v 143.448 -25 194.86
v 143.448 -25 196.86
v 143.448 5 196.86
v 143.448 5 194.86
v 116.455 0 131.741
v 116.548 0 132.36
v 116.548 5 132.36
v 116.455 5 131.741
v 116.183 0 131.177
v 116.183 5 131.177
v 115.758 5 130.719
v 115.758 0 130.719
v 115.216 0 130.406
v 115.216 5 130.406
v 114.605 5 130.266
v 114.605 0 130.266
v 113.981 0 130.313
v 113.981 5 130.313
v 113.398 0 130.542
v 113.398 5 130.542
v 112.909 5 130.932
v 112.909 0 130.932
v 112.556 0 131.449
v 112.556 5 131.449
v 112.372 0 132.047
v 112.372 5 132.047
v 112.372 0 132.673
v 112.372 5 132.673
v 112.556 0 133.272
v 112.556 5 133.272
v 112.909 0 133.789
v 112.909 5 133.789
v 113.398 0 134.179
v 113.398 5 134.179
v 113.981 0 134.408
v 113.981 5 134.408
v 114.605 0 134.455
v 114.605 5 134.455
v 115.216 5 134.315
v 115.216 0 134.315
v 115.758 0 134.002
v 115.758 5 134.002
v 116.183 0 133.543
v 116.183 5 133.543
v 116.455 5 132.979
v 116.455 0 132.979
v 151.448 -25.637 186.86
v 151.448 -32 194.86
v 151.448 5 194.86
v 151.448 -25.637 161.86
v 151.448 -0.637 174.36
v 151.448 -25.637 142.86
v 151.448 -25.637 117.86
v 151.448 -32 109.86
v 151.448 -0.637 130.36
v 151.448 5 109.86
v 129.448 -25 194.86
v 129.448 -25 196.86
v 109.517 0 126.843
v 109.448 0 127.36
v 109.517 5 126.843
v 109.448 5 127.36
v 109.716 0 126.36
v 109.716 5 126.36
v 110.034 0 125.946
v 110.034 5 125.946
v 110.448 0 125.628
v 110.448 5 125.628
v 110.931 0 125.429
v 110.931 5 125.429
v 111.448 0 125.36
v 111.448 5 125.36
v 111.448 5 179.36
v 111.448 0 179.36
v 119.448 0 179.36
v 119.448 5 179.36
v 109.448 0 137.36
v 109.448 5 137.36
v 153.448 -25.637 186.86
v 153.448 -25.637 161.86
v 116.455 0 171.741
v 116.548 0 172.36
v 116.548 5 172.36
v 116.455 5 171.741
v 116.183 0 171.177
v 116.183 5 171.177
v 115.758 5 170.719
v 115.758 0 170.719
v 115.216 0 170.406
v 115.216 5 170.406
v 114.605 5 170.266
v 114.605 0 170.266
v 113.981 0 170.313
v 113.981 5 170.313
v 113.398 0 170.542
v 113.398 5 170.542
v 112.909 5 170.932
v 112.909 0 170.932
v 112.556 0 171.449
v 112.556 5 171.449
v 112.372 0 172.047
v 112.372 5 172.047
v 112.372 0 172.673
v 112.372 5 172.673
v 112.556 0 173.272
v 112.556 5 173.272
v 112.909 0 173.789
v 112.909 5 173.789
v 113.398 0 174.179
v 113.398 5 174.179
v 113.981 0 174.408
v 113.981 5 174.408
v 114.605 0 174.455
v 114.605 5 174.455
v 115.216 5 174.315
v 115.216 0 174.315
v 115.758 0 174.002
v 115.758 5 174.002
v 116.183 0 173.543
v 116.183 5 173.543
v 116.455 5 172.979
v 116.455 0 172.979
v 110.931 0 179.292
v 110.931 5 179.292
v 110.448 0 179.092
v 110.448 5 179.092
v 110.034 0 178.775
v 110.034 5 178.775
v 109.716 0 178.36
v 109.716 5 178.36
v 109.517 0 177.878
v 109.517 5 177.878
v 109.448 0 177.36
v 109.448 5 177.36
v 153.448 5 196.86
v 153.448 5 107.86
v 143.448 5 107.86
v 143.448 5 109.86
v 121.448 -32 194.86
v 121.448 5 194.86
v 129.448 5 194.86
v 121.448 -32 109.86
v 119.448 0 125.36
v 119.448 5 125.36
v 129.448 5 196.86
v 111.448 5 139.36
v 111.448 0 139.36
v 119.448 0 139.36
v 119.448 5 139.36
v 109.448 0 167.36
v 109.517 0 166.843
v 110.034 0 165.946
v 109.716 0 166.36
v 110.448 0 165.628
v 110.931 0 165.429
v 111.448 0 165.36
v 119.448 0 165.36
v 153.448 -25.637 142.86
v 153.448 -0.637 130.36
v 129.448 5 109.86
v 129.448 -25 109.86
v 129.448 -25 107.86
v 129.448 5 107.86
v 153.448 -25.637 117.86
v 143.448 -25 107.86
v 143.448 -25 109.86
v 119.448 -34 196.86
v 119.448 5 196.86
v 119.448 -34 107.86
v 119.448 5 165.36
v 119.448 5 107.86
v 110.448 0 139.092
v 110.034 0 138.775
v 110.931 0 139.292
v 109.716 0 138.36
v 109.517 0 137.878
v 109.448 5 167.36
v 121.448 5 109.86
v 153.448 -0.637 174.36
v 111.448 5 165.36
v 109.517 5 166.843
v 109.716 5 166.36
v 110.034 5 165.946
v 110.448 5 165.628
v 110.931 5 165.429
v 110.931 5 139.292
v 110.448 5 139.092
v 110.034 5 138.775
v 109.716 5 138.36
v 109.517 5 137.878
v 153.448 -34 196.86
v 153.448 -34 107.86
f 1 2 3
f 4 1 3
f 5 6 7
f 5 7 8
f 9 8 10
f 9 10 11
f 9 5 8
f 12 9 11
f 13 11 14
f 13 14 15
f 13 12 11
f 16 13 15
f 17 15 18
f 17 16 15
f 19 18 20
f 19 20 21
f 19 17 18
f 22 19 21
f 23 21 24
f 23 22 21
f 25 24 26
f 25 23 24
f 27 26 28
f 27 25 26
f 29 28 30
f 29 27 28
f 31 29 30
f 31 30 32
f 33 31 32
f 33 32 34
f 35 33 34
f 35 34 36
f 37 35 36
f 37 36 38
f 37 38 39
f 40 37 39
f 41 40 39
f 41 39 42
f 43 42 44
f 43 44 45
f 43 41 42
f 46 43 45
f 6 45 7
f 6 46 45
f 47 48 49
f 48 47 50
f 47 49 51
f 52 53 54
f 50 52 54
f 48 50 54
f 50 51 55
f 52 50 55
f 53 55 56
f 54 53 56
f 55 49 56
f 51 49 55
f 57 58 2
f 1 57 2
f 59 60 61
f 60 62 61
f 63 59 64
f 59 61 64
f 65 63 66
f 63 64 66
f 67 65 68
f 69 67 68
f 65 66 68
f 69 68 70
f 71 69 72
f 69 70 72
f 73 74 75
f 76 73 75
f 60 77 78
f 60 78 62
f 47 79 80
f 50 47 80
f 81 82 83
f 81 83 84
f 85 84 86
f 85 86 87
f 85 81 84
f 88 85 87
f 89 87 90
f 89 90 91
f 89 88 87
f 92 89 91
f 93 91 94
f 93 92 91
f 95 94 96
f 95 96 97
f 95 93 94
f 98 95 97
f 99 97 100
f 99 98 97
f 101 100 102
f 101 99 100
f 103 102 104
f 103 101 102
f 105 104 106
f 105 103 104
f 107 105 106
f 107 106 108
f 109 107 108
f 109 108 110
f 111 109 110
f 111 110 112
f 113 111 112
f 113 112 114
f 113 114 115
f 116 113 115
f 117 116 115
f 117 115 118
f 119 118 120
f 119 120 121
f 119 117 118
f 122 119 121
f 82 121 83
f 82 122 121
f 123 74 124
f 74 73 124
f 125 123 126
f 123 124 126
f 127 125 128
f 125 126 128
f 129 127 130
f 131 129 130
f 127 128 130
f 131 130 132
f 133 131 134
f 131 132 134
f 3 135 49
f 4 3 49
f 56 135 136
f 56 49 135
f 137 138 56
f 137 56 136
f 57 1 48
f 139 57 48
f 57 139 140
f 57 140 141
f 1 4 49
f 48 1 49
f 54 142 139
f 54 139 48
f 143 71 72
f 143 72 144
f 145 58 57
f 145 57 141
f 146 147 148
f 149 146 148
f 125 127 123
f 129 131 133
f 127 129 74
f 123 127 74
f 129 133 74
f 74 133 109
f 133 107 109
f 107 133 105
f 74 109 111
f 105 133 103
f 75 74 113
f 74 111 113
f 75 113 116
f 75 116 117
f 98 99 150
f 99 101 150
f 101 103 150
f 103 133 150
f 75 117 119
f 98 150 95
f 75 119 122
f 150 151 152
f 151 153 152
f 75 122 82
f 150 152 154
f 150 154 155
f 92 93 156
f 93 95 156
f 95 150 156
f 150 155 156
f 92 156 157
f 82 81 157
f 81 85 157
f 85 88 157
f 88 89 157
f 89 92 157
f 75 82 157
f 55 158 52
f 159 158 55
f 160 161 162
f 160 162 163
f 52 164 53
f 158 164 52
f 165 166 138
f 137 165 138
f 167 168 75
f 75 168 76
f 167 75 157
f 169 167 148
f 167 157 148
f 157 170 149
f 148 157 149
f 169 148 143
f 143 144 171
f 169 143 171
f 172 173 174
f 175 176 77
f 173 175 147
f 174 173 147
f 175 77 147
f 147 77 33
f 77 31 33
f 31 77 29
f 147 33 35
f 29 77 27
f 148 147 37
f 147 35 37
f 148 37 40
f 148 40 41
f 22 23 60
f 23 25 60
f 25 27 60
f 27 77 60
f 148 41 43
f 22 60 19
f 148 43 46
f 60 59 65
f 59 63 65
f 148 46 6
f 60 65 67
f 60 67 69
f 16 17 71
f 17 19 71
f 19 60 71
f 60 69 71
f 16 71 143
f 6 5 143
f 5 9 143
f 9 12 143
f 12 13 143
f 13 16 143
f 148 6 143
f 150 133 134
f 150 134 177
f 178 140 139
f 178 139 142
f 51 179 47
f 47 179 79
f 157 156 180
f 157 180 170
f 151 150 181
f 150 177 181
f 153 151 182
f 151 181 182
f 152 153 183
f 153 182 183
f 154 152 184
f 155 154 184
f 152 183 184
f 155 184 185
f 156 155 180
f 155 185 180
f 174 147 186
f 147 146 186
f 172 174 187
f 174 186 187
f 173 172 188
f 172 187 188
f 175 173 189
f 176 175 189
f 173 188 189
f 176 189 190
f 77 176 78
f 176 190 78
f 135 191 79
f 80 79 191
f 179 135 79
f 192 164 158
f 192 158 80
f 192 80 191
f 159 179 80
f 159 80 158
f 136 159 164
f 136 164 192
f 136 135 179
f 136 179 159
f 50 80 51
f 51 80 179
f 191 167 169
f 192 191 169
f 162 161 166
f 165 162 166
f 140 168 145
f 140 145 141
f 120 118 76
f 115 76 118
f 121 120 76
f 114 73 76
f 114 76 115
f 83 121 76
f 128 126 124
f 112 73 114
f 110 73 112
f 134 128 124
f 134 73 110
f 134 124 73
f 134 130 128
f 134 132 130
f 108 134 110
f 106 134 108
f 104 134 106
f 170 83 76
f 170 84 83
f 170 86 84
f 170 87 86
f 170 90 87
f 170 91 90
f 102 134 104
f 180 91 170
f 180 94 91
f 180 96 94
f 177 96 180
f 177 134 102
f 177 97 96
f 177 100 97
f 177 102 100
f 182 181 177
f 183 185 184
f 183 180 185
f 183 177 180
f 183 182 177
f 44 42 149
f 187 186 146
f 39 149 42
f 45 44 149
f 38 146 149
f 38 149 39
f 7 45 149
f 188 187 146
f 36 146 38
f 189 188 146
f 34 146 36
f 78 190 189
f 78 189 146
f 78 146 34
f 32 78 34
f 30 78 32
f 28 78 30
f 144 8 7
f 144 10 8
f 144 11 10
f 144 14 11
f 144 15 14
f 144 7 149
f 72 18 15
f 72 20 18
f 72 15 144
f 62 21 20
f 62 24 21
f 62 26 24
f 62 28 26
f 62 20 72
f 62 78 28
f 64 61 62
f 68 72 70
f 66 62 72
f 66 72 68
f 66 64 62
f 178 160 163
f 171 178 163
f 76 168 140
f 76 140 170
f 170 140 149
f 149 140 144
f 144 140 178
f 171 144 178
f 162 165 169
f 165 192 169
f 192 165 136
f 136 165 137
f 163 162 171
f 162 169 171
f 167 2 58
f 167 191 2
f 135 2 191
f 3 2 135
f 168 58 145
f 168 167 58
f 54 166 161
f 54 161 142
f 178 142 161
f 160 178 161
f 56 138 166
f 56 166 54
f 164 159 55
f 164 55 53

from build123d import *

# Parameters (mm, degrees)
SKETCH2_W             = 10
SKETCH2_H             = 14
SKETCH2_R             = 2.1
BOSS_EXTRUDE1_DEPTH   = 5
BOSS_EXTRUDE1_2_DEPTH = 5
SKETCH3_W             = 44.5
SKETCH3_H             = 39
SKETCH3_W_2           = 14
SKETCH3_H_2           = 5
BOSS_EXTRUDE2_DEPTH   = 2
BOSS_EXTRUDE4_DEPTH   = 32
SKETCH5_W             = 2
SKETCH5_H             = 85
BOSS_EXTRUDE5_DEPTH   = 37
SKETCH6_W             = 14
SKETCH6_H             = 30
CUT_EXTRUDE1_DEPTH    = 200
SKETCH7_W             = 20
SKETCH7_H             = 20
CUT_EXTRUDE2_DEPTH    = 16
FILLET1_R             = 2
SKETCH8_W             = 119.619460544
SKETCH8_H             = 55.607641494
CUT_EXTRUDE3_DEPTH    = 32
SKETCH9_W             = 100
SKETCH9_H             = 35
BOSS_EXTRUDE6_DEPTH   = 2
SKETCH10_W            = 89
SKETCH10_H            = 4
CUT_EXTRUDE4_DEPTH    = 10
BOSS_EXTRUDE7_DEPTH   = 25
SKETCH12_W            = 2
SKETCH12_H            = 35
BOSS_EXTRUDE8_DEPTH   = 2
SKETCH13_W            = 104
SKETCH13_H            = 37
BOSS_EXTRUDE9_DEPTH   = 2
SKETCH14_W            = 13
SKETCH14_H            = 30
CUT_EXTRUDE5_DEPTH    = 104
SKETCH15_W            = 113.891819436
SKETCH15_H            = 51.603678666
CUT_EXTRUDE6_DEPTH    = 27
SKETCH16_W            = 114.232812907
SKETCH16_H            = 49.785046819
CUT_EXTRUDE7_DEPTH    = 2
SKETCH17_W            = 89
SKETCH17_H            = 39
BOSS_EXTRUDE10_DEPTH  = 34
SKETCH18_W            = 30
SKETCH18_H            = 85
CUT_EXTRUDE8_DEPTH    = 37
SKETCH19_W            = 7
SKETCH19_H            = 30
CUT_EXTRUDE9_DEPTH    = 93
CUT_EXTRUDE10_DEPTH   = 17


with BuildPart() as part:
    # Sketch2 → Boss-Extrude1 (new body)
    with BuildSketch(Plane(origin=(0, 0, 0), x_dir=(1, 0, 0), z_dir=(0, 1, 0))):
        with Locations((114.448385229, -132.360414745)):
            Rectangle(SKETCH2_W, SKETCH2_H)
        with Locations((114.448385229, -132.360414745)):
            Circle(SKETCH2_R, mode=Mode.SUBTRACT)
    extrude(amount=BOSS_EXTRUDE1_DEPTH)



with BuildPart() as body_2:
    # Sketch2 → Boss-Extrude1 2 (new body)
    with BuildSketch(Plane(origin=(0, 0, 0), x_dir=(1, 0, 0), z_dir=(0, 1, 0))):
        with Locations((114.448385229, -172.360414745)):
            Rectangle(SKETCH2_W, SKETCH2_H)
        with Locations((114.448385229, -172.360414745)):
            Circle(SKETCH2_R, mode=Mode.SUBTRACT)
    extrude(amount=BOSS_EXTRUDE1_2_DEPTH)


with BuildPart() as part_1:
    add(part.part)

    add(body_2.part)  # Boss-Extrude2 merges body 2
    # Sketch3 → Boss-Extrude2 (add)
    with BuildSketch(Plane(origin=(119.448385229, 0, 0), x_dir=(0, 0, -1), z_dir=(1, 0, 0))):
        Polygon((-152.360414745, -34), (-152.360414745, 5), (-165.360414745, 5), (-165.360414745, 0), (-179.360414745, 0), (-179.360414745, 5), (-196.860414745, 5), (-196.860414745, -34), align=None)
        with Locations((-130.110414745, -14.5)):
            Rectangle(SKETCH3_W, SKETCH3_H)
        with Locations((-172.360414745, 2.5)):
            Rectangle(SKETCH3_W_2, SKETCH3_H_2)
    extrude(amount=BOSS_EXTRUDE2_DEPTH)

    # Sketch4 → Boss-Extrude4 (add)
    with BuildSketch(Plane(origin=(121.448385229, 0, 0), x_dir=(0, 0, -1), z_dir=(1, 0, 0))):
        Polygon((-194.860414745, 5), (-196.860414745, 5), (-196.860414745, -34), (-107.860414745, -34), (-107.860414745, 5), (-109.860414745, 5), (-109.860414745, -32), (-194.860414745, -32), align=None)
    extrude(amount=BOSS_EXTRUDE4_DEPTH)

    # Sketch5 → Boss-Extrude5 (add)
    with BuildSketch(Plane(origin=(0, -32, 0), x_dir=(1, 0, 0), z_dir=(0, 1, 0))):
        with Locations((152.448385229, -152.360414745)):
            Rectangle(SKETCH5_W, SKETCH5_H)
    extrude(amount=BOSS_EXTRUDE5_DEPTH)

    # Sketch6 → Cut-Extrude1 (cut)
    with BuildSketch(Plane.XY.offset(196.860414745)):
        with Locations((136.448385229, -10)):
            Rectangle(SKETCH6_W, SKETCH6_H)
    extrude(amount=-CUT_EXTRUDE1_DEPTH, mode=Mode.SUBTRACT)

    # Sketch7 → Cut-Extrude2 (cut)
    with BuildSketch(Plane(origin=(153.448385229, 0, 0), x_dir=(0, 0, -1), z_dir=(1, 0, 0))):
        with Locations((-179.360414745, -14.5)):
            Rectangle(SKETCH7_W, SKETCH7_H)
        with Locations((-152.360414745, -14.5)):
            Rectangle(SKETCH7_W, SKETCH7_H)
        with Locations((-125.360414745, -14.5)):
            Rectangle(SKETCH7_W, SKETCH7_H)
    extrude(amount=-CUT_EXTRUDE2_DEPTH, mode=Mode.SUBTRACT)

    # Fillet1
    fillet1_edges = [part_1.edges().sort_by_distance(p)[0] for p in [
        (109.448385229, 2.5, 139.360414745),
        (109.448385229, 2.5, 125.360414745),
        (109.448385229, 2.5, 179.360414745),
        (109.448385229, 2.5, 165.360414745),
    ]]
    fillet(fillet1_edges, radius=FILLET1_R)

    # Sketch8 → Cut-Extrude3 (cut)
    with BuildSketch(Plane(origin=(153.448385229, 0, 0), x_dir=(0, 0, -1), z_dir=(1, 0, 0))):
        with Locations((-148.578534845, -15.335015755)):
            Rectangle(SKETCH8_W, SKETCH8_H)
    extrude(amount=-CUT_EXTRUDE3_DEPTH, mode=Mode.SUBTRACT)

    # Sketch9 → Boss-Extrude6 (add)
    with BuildSketch(Plane(origin=(121.448385229, 0, 0), x_dir=(0, 0, -1), z_dir=(1, 0, 0))):
        with Locations((-152.360414745, -12.5)):
            Rectangle(SKETCH9_W, SKETCH9_H)
    extrude(amount=-BOSS_EXTRUDE6_DEPTH)

    # Sketch10 → Cut-Extrude4 (cut)
    with BuildSketch(Plane(origin=(121.448385229, 0, 0), x_dir=(0, 0, -1), z_dir=(1, 0, 0))):
        with Locations((-152.360414745, -32)):
            Rectangle(SKETCH10_W, SKETCH10_H)
    extrude(amount=-CUT_EXTRUDE4_DEPTH, mode=Mode.SUBTRACT)



with BuildPart() as body_2_2:
    # Sketch11 → Boss-Extrude7 (new body)
    with BuildSketch(Plane(origin=(121.448385229, 0, 0), x_dir=(0, 0, -1), z_dir=(1, 0, 0))):
        Polygon((-202.360414745, -30), (-202.360414745, 5), (-204.360414745, 5), (-204.360414745, -32), (-100.360414745, -32), (-100.360414745, 5), (-102.360414745, 5), (-102.360414745, -30), align=None)
    extrude(amount=BOSS_EXTRUDE7_DEPTH)


with BuildPart() as part_2:
    add(part_1.part)

    add(body_2_2.part)  # Boss-Extrude8 merges body 2 2
    # Sketch12 → Boss-Extrude8 (add)
    with BuildSketch(Plane.ZY.offset(-121.448385229)):
        with Locations((101.360414745, -12.5)):
            Rectangle(SKETCH12_W, SKETCH12_H)
        Polygon((102.360414745, -30), (100.360414745, -30), (100.360414745, -32), (204.360414745, -32), (204.360414745, -30), (202.360414745, -30), align=None)
        with Locations((203.360414745, -12.5)):
            Rectangle(SKETCH12_W, SKETCH12_H)
    extrude(amount=BOSS_EXTRUDE8_DEPTH)

    # Sketch13 → Boss-Extrude9 (add)
    with BuildSketch(Plane(origin=(146.448385229, 0, 0), x_dir=(0, 0, -1), z_dir=(1, 0, 0))):
        with Locations((-152.360414745, -13.5)):
            Rectangle(SKETCH13_W, SKETCH13_H)
        Polygon((-195.798080738, -22), (-175.798080738, -22), (-185.798080738, -0.554930795), align=None, mode=Mode.SUBTRACT)
        Polygon((-128.922748753, -22), (-118.922748753, -0.554930795), (-108.922748753, -22), align=None, mode=Mode.SUBTRACT)
        Polygon((-162.360414745, -22), (-142.360414745, -22), (-152.360414745, -0.554930795), align=None, mode=Mode.SUBTRACT)
    extrude(amount=BOSS_EXTRUDE9_DEPTH)

    # Sketch14 → Cut-Extrude5 (cut)
    with BuildSketch(Plane(origin=(0, 0, 100.360414745), x_dir=(-1, 0, 0), z_dir=(0, 0, -1))):
        with Locations((-133.948385229, 5)):
            Rectangle(SKETCH14_W, SKETCH14_H)
    extrude(amount=-CUT_EXTRUDE5_DEPTH, mode=Mode.SUBTRACT)

    # Sketch15 → Cut-Extrude6 (cut)
    with BuildSketch(Plane(origin=(148.448385229, 0, 0), x_dir=(0, 0, -1), z_dir=(1, 0, 0))):
        with Locations((-152.246750255, -13.320211528)):
            Rectangle(SKETCH15_W, SKETCH15_H)
    extrude(amount=-CUT_EXTRUDE6_DEPTH, mode=Mode.SUBTRACT)

    # Sketch16 → Cut-Extrude7 (cut)
    with BuildSketch(Plane(origin=(121.448385229, 0, 0), x_dir=(0, 0, -1), z_dir=(1, 0, 0))):
        with Locations((-151.848924539, -14.329503265)):
            Rectangle(SKETCH16_W, SKETCH16_H)
    extrude(amount=-CUT_EXTRUDE7_DEPTH, mode=Mode.SUBTRACT)

    # Sketch17 → Boss-Extrude10 (add)
    with BuildSketch(Plane(origin=(119.448385229, 0, 0), x_dir=(0, 0, -1), z_dir=(1, 0, 0))):
        with Locations((-152.360414745, -14.5)):
            Rectangle(SKETCH17_W, SKETCH17_H)
    extrude(amount=BOSS_EXTRUDE10_DEPTH)

    # Sketch18 → Cut-Extrude8 (cut)
    with BuildSketch(Plane(origin=(0, 5, 0), x_dir=(1, 0, 0), z_dir=(0, 1, 0))):
        with Locations((136.448385229, -152.360414745)):
            Rectangle(SKETCH18_W, SKETCH18_H)
    extrude(amount=-CUT_EXTRUDE8_DEPTH, mode=Mode.SUBTRACT)

    # Sketch19 → Cut-Extrude9 (cut)
    with BuildSketch(Plane.XY.offset(196.860414745)):
        with Locations((132.948385229, -10)):
            Rectangle(SKETCH19_W, SKETCH19_H)
        with Locations((139.948385229, -10)):
            Rectangle(SKETCH19_W, SKETCH19_H)
    extrude(amount=-CUT_EXTRUDE9_DEPTH, mode=Mode.SUBTRACT)

    # Sketch20 → Cut-Extrude10 (cut)
    with BuildSketch(Plane(origin=(153.448385229, 0, 0), x_dir=(0, 0, -1), z_dir=(1, 0, 0))):
        Polygon((-186.860414745, -25.637480673), (-161.860414745, -25.637480673), (-174.360414745, -0.637480673), align=None)
        Polygon((-117.860414745, -25.637480673), (-142.860414745, -25.637480673), (-130.360414745, -0.637480673), align=None)
    extrude(amount=-CUT_EXTRUDE10_DEPTH, mode=Mode.SUBTRACT)


solid = part_2.part
